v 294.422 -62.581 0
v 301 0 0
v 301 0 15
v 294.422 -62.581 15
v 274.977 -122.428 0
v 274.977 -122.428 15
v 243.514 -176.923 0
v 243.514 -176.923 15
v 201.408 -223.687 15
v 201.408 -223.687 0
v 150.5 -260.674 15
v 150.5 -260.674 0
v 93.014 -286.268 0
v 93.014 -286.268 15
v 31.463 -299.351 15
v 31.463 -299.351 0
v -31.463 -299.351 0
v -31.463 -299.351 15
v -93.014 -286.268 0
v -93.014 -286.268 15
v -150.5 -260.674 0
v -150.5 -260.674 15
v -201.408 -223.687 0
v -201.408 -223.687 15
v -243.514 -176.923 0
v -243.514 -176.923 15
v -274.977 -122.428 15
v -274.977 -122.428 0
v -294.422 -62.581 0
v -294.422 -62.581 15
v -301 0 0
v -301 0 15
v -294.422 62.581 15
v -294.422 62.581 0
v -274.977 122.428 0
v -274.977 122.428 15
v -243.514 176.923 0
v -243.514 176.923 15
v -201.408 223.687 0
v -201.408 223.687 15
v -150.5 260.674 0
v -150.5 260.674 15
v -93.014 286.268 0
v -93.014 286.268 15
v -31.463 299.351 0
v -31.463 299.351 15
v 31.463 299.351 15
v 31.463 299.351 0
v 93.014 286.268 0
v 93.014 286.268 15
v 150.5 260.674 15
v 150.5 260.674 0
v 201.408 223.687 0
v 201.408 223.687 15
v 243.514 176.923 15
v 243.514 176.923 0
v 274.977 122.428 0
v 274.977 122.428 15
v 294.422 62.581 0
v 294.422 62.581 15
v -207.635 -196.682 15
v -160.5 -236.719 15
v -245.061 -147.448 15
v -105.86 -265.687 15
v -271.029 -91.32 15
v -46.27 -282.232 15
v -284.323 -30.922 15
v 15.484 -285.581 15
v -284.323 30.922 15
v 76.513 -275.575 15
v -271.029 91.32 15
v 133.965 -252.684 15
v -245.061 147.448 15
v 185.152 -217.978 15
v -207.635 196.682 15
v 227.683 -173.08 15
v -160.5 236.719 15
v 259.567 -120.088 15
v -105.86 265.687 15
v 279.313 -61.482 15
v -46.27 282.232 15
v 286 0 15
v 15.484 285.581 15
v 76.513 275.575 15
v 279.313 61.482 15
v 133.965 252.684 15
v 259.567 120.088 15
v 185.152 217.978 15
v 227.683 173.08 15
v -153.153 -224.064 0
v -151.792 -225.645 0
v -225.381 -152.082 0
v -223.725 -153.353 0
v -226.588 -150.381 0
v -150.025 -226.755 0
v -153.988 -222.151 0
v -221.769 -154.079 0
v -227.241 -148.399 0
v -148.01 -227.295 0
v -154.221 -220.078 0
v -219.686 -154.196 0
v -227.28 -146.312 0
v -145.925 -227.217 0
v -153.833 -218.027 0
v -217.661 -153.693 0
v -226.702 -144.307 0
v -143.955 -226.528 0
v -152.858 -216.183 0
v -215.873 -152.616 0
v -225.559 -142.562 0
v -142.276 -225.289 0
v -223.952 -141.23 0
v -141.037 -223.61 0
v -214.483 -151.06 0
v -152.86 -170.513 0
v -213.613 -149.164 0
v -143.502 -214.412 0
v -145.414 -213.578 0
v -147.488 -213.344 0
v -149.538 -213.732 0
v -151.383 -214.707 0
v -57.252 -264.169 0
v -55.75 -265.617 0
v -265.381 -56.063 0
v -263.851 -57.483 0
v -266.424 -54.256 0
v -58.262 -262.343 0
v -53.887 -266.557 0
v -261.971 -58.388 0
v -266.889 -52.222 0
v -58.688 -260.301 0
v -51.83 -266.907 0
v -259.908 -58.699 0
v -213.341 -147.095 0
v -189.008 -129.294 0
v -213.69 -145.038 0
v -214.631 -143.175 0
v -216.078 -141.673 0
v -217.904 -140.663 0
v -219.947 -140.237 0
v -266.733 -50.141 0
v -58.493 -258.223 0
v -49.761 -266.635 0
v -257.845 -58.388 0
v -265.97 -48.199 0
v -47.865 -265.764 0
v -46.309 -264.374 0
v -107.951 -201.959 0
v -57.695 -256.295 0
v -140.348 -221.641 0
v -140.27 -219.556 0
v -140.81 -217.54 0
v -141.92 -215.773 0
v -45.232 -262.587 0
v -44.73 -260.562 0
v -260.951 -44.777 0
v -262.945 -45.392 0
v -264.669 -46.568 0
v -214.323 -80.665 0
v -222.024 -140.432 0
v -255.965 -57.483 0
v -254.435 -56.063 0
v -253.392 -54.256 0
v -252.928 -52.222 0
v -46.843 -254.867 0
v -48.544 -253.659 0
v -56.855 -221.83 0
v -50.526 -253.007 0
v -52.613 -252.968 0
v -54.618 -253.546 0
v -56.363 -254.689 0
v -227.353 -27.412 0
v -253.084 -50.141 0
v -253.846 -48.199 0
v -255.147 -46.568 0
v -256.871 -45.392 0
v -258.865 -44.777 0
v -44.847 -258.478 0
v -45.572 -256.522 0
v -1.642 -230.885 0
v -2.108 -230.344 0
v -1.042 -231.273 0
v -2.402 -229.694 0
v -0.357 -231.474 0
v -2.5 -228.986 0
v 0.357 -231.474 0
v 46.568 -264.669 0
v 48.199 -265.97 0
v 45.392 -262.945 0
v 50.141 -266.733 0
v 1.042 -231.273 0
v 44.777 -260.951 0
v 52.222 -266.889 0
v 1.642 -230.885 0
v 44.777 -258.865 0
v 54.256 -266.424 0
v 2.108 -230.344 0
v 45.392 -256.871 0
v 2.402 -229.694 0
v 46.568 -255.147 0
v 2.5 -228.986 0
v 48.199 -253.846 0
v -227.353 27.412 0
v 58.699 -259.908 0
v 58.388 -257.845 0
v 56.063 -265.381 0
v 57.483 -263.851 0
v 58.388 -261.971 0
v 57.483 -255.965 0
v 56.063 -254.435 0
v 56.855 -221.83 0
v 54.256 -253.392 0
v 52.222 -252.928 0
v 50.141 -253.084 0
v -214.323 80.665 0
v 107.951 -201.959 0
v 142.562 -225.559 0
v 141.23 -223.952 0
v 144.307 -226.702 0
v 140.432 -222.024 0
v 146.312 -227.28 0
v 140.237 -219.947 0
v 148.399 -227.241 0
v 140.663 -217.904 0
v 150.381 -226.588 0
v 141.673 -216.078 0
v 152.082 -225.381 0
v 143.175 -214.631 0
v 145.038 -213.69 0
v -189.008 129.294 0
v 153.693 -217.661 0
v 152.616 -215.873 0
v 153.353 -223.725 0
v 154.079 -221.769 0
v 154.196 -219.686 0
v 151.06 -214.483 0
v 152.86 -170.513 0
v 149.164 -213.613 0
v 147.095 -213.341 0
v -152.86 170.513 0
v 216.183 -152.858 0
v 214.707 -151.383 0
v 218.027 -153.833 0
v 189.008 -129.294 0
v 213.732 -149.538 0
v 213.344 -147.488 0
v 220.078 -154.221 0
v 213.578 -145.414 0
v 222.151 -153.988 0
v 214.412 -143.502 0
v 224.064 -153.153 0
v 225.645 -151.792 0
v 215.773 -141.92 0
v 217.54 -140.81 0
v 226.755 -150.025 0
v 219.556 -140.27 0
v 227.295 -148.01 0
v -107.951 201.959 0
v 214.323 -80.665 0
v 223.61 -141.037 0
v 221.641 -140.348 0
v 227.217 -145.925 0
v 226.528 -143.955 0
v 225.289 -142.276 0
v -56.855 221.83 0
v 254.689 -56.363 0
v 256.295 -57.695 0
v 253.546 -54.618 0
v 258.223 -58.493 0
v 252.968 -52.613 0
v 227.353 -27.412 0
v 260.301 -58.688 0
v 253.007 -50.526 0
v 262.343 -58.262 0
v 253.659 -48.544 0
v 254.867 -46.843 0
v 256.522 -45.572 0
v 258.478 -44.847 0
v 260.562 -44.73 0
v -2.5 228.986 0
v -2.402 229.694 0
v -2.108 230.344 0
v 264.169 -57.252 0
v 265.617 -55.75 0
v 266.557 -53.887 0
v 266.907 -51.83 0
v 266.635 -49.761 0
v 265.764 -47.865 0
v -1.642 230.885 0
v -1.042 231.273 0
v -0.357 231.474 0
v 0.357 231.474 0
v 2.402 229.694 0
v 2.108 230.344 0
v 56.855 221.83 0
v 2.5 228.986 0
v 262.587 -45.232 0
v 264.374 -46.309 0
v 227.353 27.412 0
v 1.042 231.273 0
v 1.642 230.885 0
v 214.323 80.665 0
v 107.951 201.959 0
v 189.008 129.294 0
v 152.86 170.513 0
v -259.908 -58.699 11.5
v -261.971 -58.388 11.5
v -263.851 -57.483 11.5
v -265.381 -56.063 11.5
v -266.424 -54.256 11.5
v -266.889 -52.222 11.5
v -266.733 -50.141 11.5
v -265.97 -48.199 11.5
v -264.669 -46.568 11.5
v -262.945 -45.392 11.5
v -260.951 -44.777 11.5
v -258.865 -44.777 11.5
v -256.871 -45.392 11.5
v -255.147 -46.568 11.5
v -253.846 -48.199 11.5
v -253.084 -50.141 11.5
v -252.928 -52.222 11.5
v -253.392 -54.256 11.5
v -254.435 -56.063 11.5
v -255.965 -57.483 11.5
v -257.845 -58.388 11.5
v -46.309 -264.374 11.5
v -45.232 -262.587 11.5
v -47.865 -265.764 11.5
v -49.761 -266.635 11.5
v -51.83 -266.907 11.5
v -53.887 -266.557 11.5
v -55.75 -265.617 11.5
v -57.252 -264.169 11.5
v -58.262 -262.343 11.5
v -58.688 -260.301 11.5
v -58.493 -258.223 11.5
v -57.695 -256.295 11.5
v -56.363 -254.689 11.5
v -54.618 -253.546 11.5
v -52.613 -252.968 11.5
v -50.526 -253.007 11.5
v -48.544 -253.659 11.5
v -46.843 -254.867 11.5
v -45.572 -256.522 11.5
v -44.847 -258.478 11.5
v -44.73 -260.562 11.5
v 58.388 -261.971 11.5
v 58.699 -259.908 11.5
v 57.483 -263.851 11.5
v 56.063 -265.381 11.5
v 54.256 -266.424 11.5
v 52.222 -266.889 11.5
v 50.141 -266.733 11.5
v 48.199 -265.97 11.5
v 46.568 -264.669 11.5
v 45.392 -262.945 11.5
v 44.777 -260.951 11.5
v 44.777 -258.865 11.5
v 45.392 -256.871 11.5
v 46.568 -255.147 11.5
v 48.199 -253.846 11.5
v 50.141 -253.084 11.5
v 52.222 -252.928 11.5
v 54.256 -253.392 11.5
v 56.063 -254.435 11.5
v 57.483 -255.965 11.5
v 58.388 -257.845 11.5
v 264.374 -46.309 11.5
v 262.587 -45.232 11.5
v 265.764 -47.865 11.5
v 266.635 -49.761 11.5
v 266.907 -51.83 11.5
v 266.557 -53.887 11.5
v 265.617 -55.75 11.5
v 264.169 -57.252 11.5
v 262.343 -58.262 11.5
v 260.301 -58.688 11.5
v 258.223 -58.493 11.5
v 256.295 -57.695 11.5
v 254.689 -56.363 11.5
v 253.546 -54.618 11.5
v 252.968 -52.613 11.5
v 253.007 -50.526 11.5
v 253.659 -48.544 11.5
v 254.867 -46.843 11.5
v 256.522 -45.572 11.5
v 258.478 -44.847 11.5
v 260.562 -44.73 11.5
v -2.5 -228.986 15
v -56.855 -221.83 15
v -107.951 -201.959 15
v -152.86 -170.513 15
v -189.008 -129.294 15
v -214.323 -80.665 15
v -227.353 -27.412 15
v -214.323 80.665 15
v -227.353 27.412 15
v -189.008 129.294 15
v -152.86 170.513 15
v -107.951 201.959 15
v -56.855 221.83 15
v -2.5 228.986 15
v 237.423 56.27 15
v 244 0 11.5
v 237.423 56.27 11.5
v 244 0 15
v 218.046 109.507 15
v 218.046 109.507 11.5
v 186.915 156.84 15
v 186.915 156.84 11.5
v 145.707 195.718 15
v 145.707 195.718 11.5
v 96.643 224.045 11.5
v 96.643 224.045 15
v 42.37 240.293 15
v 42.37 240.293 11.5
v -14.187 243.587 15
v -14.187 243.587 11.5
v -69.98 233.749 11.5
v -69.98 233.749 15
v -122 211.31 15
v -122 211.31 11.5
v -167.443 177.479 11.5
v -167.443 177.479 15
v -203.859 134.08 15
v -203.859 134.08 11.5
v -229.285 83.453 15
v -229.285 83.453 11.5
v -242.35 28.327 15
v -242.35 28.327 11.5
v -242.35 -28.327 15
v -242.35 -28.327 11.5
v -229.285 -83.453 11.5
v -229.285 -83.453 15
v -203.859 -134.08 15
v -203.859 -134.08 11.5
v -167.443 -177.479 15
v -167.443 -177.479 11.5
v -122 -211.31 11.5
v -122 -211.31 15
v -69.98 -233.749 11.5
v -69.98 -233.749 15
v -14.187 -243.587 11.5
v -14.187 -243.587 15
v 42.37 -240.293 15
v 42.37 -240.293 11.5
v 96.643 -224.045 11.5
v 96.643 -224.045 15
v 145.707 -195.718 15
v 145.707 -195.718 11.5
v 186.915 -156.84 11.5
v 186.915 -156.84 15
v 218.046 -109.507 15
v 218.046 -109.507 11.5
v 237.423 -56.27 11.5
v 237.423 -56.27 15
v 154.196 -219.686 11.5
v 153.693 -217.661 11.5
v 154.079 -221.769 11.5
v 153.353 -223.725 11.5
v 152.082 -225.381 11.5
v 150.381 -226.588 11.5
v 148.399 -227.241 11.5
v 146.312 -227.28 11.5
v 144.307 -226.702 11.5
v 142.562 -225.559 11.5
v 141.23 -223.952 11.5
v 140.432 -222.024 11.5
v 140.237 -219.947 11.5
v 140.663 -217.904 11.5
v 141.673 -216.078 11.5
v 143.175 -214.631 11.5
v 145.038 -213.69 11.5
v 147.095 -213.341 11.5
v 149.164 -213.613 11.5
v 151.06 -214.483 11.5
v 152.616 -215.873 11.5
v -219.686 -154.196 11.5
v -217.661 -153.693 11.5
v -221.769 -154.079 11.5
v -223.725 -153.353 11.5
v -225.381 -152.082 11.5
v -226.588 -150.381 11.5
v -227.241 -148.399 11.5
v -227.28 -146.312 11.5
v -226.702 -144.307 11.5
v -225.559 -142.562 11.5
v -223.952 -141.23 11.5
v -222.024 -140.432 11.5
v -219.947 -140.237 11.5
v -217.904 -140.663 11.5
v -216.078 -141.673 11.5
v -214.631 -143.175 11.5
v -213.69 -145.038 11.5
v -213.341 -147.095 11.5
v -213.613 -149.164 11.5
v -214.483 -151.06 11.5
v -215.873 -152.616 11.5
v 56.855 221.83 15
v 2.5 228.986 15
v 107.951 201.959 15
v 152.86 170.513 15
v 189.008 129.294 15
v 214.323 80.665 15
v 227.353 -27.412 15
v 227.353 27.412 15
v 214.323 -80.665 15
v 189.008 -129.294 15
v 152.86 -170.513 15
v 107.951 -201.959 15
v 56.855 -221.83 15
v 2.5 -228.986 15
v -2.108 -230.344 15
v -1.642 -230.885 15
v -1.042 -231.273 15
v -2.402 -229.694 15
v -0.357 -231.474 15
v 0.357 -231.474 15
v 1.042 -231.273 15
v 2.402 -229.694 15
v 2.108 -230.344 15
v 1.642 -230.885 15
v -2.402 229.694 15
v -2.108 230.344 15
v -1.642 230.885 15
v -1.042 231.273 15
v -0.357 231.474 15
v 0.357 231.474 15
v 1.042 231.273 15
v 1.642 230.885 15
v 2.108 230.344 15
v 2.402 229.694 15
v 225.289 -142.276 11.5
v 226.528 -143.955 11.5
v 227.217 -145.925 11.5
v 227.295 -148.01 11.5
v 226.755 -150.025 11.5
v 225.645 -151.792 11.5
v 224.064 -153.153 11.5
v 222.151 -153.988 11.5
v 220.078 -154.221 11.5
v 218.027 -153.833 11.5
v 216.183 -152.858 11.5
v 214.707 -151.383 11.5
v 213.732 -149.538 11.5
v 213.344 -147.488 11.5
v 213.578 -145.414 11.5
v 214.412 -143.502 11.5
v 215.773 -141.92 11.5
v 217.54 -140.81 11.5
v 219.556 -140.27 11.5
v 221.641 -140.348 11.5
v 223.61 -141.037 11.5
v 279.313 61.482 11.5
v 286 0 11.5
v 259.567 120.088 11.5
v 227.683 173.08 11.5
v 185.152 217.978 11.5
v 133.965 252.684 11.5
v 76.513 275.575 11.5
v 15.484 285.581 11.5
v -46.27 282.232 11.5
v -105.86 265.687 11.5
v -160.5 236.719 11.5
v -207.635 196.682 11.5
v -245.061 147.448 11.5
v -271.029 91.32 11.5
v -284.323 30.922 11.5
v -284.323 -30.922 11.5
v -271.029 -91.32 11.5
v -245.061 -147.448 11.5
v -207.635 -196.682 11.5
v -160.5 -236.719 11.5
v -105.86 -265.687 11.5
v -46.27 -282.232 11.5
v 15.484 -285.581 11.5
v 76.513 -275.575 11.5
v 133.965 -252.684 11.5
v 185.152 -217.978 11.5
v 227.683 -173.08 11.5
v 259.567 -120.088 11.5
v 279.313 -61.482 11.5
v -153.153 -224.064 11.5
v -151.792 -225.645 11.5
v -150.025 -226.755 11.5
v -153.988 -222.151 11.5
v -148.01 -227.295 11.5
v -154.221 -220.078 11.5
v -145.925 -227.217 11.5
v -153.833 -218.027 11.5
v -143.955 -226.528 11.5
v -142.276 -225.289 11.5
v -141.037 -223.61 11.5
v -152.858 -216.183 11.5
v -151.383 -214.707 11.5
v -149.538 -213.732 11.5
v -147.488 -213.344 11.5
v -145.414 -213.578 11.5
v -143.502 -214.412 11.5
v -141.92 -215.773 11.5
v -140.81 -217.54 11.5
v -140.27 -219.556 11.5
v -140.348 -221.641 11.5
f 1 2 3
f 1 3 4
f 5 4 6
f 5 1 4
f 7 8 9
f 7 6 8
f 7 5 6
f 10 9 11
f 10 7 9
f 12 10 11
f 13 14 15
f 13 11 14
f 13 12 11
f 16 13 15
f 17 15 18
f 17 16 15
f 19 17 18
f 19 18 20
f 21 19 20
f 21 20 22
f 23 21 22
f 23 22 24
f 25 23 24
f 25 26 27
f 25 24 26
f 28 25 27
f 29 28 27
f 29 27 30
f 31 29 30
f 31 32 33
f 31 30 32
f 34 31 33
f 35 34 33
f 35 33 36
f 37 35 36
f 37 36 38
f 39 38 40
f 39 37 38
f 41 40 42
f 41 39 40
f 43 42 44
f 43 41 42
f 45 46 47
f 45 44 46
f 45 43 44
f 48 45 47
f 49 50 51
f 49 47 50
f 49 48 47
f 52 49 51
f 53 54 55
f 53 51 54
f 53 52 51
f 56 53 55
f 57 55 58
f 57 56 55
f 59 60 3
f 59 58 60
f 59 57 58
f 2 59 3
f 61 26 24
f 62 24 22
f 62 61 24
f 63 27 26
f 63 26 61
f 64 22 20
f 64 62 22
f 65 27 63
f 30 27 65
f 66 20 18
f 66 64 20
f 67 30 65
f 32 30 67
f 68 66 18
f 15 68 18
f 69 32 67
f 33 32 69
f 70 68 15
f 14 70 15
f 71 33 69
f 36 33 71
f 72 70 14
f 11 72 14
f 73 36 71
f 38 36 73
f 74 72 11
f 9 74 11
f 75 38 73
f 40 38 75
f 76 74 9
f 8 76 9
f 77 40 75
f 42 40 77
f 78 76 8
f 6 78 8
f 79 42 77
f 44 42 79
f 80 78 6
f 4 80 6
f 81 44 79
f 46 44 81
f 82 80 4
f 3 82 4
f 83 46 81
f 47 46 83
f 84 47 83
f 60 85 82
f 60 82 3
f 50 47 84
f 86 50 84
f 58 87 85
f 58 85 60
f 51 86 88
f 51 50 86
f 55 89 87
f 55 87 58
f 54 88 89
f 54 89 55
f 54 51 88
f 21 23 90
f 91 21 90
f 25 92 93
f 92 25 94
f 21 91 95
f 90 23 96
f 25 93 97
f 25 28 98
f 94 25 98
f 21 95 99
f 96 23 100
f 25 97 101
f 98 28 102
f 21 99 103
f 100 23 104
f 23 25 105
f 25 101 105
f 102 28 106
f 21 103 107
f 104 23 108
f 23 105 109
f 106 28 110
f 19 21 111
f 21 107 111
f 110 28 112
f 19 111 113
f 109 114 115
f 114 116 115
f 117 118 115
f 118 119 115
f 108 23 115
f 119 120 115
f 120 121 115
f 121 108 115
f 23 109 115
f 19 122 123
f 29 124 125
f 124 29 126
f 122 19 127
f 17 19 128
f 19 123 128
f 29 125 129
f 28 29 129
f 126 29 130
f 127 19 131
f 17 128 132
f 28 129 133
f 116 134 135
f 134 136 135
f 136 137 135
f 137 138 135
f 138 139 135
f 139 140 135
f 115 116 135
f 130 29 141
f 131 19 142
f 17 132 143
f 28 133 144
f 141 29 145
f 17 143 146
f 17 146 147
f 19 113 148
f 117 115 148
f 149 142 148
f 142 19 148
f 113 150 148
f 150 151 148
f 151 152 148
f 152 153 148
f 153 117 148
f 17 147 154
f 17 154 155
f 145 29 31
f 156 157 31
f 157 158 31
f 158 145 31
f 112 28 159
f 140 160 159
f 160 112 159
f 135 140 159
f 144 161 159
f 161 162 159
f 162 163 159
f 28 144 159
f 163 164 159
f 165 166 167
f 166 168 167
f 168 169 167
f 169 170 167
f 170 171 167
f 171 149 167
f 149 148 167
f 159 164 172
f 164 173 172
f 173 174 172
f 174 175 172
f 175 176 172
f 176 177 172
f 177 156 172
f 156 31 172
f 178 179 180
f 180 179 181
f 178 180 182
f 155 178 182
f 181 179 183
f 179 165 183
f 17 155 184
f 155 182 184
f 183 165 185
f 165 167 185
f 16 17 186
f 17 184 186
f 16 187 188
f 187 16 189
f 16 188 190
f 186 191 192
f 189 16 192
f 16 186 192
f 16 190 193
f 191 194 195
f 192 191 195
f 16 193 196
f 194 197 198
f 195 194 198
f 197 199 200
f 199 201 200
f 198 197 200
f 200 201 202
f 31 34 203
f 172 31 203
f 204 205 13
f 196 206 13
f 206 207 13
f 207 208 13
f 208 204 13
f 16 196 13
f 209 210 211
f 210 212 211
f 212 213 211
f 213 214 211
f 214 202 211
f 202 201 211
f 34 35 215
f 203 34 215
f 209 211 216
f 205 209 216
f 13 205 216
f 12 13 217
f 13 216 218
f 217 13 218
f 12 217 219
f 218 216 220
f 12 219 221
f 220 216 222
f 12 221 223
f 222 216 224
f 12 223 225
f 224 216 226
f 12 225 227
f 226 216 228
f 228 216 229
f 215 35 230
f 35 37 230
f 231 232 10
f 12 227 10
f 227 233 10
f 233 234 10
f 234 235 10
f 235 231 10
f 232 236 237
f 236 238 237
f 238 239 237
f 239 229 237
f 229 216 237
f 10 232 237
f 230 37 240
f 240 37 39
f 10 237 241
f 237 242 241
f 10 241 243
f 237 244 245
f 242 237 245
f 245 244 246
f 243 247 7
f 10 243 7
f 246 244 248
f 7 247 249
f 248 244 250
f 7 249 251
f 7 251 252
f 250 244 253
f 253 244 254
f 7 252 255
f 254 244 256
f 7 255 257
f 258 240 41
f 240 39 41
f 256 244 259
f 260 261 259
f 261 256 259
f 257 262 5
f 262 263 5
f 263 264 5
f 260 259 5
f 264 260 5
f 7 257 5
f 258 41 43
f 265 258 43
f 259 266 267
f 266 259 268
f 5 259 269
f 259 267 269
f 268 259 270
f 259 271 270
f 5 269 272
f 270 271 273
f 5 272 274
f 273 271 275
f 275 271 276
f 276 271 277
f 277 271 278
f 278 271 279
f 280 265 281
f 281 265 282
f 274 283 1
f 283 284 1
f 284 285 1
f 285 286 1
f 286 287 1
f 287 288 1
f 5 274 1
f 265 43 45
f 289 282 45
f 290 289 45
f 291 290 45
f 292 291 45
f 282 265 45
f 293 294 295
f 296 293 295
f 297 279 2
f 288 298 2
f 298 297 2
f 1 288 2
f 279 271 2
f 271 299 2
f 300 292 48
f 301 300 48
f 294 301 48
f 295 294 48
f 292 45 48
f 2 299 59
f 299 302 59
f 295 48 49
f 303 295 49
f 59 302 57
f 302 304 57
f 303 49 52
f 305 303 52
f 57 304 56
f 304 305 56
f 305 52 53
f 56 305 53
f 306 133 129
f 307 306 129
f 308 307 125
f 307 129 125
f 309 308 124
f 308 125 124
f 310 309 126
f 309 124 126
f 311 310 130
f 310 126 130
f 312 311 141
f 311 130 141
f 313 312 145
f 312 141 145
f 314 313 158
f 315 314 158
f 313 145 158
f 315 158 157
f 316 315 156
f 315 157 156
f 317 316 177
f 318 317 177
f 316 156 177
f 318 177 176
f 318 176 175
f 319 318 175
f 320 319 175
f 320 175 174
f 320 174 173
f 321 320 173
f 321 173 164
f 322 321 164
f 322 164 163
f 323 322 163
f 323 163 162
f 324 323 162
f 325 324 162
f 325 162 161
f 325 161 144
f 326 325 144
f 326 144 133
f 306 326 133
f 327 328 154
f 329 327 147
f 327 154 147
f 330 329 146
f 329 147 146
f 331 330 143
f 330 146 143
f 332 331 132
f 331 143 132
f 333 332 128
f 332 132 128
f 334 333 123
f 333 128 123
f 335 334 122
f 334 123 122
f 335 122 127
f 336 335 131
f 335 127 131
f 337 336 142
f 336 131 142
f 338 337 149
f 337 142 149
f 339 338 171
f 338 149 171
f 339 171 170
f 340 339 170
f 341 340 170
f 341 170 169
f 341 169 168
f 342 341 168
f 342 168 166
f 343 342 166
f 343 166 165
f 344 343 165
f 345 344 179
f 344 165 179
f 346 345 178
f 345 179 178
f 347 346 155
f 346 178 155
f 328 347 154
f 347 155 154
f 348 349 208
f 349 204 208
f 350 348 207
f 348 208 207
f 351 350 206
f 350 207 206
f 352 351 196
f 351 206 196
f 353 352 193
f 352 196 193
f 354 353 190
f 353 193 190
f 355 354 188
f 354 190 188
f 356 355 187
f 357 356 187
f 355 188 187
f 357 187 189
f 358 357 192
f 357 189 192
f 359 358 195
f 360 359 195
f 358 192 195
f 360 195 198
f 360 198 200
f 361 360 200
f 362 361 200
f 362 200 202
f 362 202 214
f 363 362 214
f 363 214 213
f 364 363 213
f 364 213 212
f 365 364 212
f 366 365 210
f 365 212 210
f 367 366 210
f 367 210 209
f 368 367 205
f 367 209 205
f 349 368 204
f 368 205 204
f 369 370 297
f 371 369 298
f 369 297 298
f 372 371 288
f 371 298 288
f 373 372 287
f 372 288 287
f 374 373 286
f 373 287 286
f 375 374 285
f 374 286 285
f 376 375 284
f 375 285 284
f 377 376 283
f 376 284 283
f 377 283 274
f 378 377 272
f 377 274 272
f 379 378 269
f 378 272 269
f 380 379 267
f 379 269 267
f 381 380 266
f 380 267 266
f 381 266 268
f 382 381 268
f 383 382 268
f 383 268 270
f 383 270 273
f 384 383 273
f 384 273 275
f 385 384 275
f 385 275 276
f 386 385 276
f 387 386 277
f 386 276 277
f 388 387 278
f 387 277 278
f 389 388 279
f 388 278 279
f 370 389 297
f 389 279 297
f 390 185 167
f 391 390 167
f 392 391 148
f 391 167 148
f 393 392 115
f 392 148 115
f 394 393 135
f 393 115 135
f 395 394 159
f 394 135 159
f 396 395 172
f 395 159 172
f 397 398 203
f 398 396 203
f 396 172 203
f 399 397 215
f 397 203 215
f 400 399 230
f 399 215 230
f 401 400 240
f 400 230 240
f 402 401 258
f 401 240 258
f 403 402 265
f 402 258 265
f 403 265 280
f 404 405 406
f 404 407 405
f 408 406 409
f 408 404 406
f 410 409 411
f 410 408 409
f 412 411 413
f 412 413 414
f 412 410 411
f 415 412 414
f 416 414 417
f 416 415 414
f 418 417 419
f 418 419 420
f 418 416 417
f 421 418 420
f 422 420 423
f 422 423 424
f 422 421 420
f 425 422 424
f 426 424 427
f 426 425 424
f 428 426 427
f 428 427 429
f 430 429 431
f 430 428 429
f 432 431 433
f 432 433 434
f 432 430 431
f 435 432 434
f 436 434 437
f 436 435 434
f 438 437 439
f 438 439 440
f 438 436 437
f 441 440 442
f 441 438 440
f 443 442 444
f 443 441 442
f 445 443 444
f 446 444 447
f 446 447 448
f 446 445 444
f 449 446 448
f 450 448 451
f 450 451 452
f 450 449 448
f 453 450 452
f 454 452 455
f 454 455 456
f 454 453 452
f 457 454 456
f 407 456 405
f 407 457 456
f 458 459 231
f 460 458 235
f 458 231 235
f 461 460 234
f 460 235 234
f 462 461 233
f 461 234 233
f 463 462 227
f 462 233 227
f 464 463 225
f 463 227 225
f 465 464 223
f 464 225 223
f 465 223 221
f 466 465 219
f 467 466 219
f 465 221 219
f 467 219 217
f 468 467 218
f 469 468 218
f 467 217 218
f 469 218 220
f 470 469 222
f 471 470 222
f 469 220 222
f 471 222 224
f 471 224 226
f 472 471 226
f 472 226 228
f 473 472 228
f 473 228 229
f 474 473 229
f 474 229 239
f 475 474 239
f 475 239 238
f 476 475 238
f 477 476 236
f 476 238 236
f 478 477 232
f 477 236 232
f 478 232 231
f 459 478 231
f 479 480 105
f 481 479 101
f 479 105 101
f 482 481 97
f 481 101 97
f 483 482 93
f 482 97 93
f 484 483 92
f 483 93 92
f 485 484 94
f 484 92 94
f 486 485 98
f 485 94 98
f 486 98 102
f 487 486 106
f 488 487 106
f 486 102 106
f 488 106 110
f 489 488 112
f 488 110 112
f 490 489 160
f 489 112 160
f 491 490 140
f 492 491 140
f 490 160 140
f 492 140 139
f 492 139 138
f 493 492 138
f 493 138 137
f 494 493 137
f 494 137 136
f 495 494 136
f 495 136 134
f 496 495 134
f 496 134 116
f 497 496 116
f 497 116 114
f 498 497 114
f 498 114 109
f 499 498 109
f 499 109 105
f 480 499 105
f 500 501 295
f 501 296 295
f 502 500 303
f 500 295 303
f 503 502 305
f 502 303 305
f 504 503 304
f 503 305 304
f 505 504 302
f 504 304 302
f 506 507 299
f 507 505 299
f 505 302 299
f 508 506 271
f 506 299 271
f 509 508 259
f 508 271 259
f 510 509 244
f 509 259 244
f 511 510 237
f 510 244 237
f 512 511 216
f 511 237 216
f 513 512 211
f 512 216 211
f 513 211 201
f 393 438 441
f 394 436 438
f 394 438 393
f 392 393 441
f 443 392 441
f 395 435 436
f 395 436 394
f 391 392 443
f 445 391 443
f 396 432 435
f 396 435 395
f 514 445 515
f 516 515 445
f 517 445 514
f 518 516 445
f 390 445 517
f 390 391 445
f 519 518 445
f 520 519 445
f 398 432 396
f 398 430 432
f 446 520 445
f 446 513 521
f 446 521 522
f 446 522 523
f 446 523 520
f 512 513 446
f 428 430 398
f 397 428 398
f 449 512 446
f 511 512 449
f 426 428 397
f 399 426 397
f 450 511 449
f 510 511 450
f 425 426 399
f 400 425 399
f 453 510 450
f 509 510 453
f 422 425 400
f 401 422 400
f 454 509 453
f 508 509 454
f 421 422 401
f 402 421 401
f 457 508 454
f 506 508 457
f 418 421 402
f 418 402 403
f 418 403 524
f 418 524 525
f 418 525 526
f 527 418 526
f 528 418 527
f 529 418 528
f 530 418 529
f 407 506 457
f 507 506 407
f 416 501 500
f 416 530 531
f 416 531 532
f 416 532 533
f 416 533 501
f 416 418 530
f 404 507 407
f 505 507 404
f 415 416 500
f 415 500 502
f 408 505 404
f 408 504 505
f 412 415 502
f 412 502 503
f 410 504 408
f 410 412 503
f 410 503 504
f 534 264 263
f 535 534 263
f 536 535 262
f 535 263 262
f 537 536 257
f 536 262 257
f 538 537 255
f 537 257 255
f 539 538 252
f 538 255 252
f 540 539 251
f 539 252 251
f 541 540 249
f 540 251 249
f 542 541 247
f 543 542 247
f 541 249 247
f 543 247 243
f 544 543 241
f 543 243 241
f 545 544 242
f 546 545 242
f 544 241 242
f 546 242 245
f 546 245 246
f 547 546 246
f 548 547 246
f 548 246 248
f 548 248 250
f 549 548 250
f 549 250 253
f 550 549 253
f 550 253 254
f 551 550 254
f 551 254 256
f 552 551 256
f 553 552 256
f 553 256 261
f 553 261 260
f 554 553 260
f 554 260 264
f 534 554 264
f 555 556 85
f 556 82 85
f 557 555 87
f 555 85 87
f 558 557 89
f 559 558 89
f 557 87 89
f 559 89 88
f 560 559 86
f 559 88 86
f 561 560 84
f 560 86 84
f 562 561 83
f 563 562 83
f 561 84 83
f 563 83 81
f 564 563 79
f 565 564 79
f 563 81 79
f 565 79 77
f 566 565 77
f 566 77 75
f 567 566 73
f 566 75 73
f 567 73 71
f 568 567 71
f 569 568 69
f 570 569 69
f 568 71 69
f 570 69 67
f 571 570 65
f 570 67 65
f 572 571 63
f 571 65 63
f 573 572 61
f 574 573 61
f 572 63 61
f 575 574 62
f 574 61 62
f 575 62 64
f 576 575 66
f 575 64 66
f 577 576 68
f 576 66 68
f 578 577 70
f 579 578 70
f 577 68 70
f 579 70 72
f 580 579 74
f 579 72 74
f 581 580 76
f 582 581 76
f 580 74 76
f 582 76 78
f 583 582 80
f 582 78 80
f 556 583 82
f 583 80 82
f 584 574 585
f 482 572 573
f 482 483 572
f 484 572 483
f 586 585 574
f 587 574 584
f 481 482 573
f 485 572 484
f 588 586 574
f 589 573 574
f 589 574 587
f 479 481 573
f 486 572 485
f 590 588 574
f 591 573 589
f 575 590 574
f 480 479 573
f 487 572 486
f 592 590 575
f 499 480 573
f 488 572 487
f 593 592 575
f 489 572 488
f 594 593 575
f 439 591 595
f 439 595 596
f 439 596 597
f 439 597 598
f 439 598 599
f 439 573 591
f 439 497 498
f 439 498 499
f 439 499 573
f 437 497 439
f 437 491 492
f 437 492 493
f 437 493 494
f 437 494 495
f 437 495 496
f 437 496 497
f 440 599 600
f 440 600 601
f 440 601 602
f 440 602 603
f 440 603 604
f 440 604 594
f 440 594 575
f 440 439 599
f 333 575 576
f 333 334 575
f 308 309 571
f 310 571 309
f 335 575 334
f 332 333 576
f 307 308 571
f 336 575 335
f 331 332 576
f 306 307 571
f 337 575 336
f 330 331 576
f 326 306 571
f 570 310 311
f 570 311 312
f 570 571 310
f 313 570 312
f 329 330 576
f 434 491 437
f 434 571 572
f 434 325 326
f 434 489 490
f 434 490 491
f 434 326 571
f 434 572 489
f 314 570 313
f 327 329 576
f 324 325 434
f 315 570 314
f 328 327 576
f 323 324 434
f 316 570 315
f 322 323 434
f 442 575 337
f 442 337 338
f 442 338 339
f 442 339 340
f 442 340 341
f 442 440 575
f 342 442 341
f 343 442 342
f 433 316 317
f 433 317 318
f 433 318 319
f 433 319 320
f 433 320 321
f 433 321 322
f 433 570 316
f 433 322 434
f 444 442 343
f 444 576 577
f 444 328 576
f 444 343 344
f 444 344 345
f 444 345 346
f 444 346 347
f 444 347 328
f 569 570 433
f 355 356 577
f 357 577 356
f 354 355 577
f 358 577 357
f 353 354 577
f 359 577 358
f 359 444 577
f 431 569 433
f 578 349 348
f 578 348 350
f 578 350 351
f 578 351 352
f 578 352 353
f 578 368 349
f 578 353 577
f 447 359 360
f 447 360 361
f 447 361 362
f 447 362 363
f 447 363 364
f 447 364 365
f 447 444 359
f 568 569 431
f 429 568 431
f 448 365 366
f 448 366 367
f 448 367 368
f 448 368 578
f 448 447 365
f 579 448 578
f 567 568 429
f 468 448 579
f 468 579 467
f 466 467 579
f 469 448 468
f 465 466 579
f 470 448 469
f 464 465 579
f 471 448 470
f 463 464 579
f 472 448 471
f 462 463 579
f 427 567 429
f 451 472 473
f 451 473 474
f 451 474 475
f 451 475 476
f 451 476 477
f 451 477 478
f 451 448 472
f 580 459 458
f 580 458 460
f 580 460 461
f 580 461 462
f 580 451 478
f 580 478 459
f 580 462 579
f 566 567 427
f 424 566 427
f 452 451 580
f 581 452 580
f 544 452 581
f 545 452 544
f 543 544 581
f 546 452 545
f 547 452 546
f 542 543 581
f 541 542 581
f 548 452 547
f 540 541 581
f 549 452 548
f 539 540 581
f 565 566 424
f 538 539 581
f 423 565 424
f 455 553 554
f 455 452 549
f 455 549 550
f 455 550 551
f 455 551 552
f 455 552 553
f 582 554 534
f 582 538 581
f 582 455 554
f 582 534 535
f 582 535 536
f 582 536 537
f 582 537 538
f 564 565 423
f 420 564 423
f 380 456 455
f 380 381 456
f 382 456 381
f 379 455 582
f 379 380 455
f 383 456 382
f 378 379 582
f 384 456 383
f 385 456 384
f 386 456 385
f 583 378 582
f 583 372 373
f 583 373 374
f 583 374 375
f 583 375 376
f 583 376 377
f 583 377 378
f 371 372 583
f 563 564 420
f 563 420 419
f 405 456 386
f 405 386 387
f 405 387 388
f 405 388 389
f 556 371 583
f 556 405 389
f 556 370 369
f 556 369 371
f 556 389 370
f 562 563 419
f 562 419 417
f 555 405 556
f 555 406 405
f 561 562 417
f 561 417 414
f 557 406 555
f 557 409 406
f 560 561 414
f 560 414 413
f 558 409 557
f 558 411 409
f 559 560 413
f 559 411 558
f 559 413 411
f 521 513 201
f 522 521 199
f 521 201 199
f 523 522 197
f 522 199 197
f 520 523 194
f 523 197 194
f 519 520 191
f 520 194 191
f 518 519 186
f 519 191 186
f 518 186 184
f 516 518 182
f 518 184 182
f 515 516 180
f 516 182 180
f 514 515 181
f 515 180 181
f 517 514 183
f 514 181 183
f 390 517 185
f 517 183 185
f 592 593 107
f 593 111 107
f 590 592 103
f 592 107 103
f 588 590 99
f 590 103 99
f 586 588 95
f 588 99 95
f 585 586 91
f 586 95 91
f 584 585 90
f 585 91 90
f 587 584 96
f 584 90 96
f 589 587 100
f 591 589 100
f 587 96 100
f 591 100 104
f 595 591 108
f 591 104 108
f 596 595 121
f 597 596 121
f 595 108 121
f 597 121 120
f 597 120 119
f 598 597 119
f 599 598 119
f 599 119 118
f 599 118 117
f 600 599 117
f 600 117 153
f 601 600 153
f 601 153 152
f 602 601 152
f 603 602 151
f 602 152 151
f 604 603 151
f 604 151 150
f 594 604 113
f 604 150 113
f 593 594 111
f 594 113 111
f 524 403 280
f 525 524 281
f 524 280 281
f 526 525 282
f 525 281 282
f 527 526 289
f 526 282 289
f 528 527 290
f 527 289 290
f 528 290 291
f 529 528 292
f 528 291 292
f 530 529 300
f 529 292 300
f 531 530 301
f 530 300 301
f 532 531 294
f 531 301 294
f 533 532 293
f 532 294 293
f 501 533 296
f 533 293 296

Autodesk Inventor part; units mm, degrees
ref_plane "YZ Plane" through (0, 0, 0) normal (1, 0, 0) x (0, 1, 0)
ref_plane "XZ Plane" through (0, 0, 0) normal (0, 1, 0) x (-1, 0, 0)
ref_plane "XY Plane" through (0, 0, 0) normal (0, 0, 1) x (1, 0, 0)
sketch "Sketch1" plane through (0, 0, 0) normal (0, 0, 1) x (1, 0, 0)
  circle A0 centre (0, 0) radius 229
  circle A1 centre (0, 0) radius 301
  circle A2 centre (0, 0) radius 265 construction
  line L0 (0, 229) -> (0, 301) construction
  point P0 (0, 265)
  dimension "d17" = 530
  dimension "d18" = 72
extrude "Extrusion1" add sketch "Sketch1" along normal blind 15
sketch "Sketch2" plane through (0, 0, 15) normal (0, 0, 1) x (1, 0, 0)
  circle A0 centre (0, 0) radius 301 construction
  circle A1 centre (0, 0) radius 229 construction
  line L0 (0, 286) -> (0, 244) construction
  line L1 (0, 229) -> (0, 0) construction
  circle A2 centre (0, 0) radius 244
  circle A3 centre (0, 0) radius 286
  circle A4 centre (0, 0) radius 265 construction
  point P0 (0, 265)
  dimension "d19" = 530
  dimension "d4" = 42
extrude "Extrusion2" cut sketch "Sketch2" against normal blind 3.5
sketch "Sketch3" plane through (0, 0, 0) normal (0, 0, 1) x (1, 0, 0)
  circle A0 centre (0, 0) radius 229 construction
  circle A1 centre (0, 0) radius 301 construction
  circle A2 centre (0, 0) radius 244 projected
  circle A3 centre (0, 0) radius 286 projected
  circle A4 centre (0, 0) radius 301 projected
  line L0 (0, 0) -> (0, -301) construction
  line L1 (0, 0) -> (58.7222, -295.2164) construction
  line L2 (47.602, -239.3116) -> (55.7958, -280.5046) construction
  circle A5 centre (51.6989, -259.9081) radius 7
  dimension "d20" = 11.25
  dimension "d21" = 14
extrude "Extrusion3" cut sketch "Sketch3" along normal through all contours A5
pattern_circular "Circular Pattern2" count 8 over 157.5 about axis through (0, 0, 0) along (0, 0, -1) of "Extrusion3" both ways yes
sketch "Sketch5" plane through (0, 0, 0) normal (0, 0, -1) x (-1, 0, 0)
  circle A0 centre (0, 0) radius 301 projected
  circle A1 centre (0, 0) radius 229 projected
  line L0 (0, 0) -> (0, 229) construction
  arc A2 (2.5, 228.9864) -> (-2.5, 228.9864) centre (0, 229) ccw
  dimension "d40" = 5
extrude "Extrusion4" cut sketch "Sketch5" against normal through all contours A1 A2
mirror "Mirror1" about plane through (0, 0, 0) normal (0, 1, 0) of "Extrusion4"
equation "\"d17\" = Шпил_пласт_КОРМА_диам_центров"
equation "\"d19\" = Шпил_пласт_КОРМА_диам_центров"
equation "\"BendReliefDepth\" = 0.5 * Thickness"
equation "\"Шпил_пласт_КОРМА_диам_центров\" = 530"
equation "\"Thickness\" = 10"
properties part number "ДМФ 022 кольцо прижимное корма внутреннее"
